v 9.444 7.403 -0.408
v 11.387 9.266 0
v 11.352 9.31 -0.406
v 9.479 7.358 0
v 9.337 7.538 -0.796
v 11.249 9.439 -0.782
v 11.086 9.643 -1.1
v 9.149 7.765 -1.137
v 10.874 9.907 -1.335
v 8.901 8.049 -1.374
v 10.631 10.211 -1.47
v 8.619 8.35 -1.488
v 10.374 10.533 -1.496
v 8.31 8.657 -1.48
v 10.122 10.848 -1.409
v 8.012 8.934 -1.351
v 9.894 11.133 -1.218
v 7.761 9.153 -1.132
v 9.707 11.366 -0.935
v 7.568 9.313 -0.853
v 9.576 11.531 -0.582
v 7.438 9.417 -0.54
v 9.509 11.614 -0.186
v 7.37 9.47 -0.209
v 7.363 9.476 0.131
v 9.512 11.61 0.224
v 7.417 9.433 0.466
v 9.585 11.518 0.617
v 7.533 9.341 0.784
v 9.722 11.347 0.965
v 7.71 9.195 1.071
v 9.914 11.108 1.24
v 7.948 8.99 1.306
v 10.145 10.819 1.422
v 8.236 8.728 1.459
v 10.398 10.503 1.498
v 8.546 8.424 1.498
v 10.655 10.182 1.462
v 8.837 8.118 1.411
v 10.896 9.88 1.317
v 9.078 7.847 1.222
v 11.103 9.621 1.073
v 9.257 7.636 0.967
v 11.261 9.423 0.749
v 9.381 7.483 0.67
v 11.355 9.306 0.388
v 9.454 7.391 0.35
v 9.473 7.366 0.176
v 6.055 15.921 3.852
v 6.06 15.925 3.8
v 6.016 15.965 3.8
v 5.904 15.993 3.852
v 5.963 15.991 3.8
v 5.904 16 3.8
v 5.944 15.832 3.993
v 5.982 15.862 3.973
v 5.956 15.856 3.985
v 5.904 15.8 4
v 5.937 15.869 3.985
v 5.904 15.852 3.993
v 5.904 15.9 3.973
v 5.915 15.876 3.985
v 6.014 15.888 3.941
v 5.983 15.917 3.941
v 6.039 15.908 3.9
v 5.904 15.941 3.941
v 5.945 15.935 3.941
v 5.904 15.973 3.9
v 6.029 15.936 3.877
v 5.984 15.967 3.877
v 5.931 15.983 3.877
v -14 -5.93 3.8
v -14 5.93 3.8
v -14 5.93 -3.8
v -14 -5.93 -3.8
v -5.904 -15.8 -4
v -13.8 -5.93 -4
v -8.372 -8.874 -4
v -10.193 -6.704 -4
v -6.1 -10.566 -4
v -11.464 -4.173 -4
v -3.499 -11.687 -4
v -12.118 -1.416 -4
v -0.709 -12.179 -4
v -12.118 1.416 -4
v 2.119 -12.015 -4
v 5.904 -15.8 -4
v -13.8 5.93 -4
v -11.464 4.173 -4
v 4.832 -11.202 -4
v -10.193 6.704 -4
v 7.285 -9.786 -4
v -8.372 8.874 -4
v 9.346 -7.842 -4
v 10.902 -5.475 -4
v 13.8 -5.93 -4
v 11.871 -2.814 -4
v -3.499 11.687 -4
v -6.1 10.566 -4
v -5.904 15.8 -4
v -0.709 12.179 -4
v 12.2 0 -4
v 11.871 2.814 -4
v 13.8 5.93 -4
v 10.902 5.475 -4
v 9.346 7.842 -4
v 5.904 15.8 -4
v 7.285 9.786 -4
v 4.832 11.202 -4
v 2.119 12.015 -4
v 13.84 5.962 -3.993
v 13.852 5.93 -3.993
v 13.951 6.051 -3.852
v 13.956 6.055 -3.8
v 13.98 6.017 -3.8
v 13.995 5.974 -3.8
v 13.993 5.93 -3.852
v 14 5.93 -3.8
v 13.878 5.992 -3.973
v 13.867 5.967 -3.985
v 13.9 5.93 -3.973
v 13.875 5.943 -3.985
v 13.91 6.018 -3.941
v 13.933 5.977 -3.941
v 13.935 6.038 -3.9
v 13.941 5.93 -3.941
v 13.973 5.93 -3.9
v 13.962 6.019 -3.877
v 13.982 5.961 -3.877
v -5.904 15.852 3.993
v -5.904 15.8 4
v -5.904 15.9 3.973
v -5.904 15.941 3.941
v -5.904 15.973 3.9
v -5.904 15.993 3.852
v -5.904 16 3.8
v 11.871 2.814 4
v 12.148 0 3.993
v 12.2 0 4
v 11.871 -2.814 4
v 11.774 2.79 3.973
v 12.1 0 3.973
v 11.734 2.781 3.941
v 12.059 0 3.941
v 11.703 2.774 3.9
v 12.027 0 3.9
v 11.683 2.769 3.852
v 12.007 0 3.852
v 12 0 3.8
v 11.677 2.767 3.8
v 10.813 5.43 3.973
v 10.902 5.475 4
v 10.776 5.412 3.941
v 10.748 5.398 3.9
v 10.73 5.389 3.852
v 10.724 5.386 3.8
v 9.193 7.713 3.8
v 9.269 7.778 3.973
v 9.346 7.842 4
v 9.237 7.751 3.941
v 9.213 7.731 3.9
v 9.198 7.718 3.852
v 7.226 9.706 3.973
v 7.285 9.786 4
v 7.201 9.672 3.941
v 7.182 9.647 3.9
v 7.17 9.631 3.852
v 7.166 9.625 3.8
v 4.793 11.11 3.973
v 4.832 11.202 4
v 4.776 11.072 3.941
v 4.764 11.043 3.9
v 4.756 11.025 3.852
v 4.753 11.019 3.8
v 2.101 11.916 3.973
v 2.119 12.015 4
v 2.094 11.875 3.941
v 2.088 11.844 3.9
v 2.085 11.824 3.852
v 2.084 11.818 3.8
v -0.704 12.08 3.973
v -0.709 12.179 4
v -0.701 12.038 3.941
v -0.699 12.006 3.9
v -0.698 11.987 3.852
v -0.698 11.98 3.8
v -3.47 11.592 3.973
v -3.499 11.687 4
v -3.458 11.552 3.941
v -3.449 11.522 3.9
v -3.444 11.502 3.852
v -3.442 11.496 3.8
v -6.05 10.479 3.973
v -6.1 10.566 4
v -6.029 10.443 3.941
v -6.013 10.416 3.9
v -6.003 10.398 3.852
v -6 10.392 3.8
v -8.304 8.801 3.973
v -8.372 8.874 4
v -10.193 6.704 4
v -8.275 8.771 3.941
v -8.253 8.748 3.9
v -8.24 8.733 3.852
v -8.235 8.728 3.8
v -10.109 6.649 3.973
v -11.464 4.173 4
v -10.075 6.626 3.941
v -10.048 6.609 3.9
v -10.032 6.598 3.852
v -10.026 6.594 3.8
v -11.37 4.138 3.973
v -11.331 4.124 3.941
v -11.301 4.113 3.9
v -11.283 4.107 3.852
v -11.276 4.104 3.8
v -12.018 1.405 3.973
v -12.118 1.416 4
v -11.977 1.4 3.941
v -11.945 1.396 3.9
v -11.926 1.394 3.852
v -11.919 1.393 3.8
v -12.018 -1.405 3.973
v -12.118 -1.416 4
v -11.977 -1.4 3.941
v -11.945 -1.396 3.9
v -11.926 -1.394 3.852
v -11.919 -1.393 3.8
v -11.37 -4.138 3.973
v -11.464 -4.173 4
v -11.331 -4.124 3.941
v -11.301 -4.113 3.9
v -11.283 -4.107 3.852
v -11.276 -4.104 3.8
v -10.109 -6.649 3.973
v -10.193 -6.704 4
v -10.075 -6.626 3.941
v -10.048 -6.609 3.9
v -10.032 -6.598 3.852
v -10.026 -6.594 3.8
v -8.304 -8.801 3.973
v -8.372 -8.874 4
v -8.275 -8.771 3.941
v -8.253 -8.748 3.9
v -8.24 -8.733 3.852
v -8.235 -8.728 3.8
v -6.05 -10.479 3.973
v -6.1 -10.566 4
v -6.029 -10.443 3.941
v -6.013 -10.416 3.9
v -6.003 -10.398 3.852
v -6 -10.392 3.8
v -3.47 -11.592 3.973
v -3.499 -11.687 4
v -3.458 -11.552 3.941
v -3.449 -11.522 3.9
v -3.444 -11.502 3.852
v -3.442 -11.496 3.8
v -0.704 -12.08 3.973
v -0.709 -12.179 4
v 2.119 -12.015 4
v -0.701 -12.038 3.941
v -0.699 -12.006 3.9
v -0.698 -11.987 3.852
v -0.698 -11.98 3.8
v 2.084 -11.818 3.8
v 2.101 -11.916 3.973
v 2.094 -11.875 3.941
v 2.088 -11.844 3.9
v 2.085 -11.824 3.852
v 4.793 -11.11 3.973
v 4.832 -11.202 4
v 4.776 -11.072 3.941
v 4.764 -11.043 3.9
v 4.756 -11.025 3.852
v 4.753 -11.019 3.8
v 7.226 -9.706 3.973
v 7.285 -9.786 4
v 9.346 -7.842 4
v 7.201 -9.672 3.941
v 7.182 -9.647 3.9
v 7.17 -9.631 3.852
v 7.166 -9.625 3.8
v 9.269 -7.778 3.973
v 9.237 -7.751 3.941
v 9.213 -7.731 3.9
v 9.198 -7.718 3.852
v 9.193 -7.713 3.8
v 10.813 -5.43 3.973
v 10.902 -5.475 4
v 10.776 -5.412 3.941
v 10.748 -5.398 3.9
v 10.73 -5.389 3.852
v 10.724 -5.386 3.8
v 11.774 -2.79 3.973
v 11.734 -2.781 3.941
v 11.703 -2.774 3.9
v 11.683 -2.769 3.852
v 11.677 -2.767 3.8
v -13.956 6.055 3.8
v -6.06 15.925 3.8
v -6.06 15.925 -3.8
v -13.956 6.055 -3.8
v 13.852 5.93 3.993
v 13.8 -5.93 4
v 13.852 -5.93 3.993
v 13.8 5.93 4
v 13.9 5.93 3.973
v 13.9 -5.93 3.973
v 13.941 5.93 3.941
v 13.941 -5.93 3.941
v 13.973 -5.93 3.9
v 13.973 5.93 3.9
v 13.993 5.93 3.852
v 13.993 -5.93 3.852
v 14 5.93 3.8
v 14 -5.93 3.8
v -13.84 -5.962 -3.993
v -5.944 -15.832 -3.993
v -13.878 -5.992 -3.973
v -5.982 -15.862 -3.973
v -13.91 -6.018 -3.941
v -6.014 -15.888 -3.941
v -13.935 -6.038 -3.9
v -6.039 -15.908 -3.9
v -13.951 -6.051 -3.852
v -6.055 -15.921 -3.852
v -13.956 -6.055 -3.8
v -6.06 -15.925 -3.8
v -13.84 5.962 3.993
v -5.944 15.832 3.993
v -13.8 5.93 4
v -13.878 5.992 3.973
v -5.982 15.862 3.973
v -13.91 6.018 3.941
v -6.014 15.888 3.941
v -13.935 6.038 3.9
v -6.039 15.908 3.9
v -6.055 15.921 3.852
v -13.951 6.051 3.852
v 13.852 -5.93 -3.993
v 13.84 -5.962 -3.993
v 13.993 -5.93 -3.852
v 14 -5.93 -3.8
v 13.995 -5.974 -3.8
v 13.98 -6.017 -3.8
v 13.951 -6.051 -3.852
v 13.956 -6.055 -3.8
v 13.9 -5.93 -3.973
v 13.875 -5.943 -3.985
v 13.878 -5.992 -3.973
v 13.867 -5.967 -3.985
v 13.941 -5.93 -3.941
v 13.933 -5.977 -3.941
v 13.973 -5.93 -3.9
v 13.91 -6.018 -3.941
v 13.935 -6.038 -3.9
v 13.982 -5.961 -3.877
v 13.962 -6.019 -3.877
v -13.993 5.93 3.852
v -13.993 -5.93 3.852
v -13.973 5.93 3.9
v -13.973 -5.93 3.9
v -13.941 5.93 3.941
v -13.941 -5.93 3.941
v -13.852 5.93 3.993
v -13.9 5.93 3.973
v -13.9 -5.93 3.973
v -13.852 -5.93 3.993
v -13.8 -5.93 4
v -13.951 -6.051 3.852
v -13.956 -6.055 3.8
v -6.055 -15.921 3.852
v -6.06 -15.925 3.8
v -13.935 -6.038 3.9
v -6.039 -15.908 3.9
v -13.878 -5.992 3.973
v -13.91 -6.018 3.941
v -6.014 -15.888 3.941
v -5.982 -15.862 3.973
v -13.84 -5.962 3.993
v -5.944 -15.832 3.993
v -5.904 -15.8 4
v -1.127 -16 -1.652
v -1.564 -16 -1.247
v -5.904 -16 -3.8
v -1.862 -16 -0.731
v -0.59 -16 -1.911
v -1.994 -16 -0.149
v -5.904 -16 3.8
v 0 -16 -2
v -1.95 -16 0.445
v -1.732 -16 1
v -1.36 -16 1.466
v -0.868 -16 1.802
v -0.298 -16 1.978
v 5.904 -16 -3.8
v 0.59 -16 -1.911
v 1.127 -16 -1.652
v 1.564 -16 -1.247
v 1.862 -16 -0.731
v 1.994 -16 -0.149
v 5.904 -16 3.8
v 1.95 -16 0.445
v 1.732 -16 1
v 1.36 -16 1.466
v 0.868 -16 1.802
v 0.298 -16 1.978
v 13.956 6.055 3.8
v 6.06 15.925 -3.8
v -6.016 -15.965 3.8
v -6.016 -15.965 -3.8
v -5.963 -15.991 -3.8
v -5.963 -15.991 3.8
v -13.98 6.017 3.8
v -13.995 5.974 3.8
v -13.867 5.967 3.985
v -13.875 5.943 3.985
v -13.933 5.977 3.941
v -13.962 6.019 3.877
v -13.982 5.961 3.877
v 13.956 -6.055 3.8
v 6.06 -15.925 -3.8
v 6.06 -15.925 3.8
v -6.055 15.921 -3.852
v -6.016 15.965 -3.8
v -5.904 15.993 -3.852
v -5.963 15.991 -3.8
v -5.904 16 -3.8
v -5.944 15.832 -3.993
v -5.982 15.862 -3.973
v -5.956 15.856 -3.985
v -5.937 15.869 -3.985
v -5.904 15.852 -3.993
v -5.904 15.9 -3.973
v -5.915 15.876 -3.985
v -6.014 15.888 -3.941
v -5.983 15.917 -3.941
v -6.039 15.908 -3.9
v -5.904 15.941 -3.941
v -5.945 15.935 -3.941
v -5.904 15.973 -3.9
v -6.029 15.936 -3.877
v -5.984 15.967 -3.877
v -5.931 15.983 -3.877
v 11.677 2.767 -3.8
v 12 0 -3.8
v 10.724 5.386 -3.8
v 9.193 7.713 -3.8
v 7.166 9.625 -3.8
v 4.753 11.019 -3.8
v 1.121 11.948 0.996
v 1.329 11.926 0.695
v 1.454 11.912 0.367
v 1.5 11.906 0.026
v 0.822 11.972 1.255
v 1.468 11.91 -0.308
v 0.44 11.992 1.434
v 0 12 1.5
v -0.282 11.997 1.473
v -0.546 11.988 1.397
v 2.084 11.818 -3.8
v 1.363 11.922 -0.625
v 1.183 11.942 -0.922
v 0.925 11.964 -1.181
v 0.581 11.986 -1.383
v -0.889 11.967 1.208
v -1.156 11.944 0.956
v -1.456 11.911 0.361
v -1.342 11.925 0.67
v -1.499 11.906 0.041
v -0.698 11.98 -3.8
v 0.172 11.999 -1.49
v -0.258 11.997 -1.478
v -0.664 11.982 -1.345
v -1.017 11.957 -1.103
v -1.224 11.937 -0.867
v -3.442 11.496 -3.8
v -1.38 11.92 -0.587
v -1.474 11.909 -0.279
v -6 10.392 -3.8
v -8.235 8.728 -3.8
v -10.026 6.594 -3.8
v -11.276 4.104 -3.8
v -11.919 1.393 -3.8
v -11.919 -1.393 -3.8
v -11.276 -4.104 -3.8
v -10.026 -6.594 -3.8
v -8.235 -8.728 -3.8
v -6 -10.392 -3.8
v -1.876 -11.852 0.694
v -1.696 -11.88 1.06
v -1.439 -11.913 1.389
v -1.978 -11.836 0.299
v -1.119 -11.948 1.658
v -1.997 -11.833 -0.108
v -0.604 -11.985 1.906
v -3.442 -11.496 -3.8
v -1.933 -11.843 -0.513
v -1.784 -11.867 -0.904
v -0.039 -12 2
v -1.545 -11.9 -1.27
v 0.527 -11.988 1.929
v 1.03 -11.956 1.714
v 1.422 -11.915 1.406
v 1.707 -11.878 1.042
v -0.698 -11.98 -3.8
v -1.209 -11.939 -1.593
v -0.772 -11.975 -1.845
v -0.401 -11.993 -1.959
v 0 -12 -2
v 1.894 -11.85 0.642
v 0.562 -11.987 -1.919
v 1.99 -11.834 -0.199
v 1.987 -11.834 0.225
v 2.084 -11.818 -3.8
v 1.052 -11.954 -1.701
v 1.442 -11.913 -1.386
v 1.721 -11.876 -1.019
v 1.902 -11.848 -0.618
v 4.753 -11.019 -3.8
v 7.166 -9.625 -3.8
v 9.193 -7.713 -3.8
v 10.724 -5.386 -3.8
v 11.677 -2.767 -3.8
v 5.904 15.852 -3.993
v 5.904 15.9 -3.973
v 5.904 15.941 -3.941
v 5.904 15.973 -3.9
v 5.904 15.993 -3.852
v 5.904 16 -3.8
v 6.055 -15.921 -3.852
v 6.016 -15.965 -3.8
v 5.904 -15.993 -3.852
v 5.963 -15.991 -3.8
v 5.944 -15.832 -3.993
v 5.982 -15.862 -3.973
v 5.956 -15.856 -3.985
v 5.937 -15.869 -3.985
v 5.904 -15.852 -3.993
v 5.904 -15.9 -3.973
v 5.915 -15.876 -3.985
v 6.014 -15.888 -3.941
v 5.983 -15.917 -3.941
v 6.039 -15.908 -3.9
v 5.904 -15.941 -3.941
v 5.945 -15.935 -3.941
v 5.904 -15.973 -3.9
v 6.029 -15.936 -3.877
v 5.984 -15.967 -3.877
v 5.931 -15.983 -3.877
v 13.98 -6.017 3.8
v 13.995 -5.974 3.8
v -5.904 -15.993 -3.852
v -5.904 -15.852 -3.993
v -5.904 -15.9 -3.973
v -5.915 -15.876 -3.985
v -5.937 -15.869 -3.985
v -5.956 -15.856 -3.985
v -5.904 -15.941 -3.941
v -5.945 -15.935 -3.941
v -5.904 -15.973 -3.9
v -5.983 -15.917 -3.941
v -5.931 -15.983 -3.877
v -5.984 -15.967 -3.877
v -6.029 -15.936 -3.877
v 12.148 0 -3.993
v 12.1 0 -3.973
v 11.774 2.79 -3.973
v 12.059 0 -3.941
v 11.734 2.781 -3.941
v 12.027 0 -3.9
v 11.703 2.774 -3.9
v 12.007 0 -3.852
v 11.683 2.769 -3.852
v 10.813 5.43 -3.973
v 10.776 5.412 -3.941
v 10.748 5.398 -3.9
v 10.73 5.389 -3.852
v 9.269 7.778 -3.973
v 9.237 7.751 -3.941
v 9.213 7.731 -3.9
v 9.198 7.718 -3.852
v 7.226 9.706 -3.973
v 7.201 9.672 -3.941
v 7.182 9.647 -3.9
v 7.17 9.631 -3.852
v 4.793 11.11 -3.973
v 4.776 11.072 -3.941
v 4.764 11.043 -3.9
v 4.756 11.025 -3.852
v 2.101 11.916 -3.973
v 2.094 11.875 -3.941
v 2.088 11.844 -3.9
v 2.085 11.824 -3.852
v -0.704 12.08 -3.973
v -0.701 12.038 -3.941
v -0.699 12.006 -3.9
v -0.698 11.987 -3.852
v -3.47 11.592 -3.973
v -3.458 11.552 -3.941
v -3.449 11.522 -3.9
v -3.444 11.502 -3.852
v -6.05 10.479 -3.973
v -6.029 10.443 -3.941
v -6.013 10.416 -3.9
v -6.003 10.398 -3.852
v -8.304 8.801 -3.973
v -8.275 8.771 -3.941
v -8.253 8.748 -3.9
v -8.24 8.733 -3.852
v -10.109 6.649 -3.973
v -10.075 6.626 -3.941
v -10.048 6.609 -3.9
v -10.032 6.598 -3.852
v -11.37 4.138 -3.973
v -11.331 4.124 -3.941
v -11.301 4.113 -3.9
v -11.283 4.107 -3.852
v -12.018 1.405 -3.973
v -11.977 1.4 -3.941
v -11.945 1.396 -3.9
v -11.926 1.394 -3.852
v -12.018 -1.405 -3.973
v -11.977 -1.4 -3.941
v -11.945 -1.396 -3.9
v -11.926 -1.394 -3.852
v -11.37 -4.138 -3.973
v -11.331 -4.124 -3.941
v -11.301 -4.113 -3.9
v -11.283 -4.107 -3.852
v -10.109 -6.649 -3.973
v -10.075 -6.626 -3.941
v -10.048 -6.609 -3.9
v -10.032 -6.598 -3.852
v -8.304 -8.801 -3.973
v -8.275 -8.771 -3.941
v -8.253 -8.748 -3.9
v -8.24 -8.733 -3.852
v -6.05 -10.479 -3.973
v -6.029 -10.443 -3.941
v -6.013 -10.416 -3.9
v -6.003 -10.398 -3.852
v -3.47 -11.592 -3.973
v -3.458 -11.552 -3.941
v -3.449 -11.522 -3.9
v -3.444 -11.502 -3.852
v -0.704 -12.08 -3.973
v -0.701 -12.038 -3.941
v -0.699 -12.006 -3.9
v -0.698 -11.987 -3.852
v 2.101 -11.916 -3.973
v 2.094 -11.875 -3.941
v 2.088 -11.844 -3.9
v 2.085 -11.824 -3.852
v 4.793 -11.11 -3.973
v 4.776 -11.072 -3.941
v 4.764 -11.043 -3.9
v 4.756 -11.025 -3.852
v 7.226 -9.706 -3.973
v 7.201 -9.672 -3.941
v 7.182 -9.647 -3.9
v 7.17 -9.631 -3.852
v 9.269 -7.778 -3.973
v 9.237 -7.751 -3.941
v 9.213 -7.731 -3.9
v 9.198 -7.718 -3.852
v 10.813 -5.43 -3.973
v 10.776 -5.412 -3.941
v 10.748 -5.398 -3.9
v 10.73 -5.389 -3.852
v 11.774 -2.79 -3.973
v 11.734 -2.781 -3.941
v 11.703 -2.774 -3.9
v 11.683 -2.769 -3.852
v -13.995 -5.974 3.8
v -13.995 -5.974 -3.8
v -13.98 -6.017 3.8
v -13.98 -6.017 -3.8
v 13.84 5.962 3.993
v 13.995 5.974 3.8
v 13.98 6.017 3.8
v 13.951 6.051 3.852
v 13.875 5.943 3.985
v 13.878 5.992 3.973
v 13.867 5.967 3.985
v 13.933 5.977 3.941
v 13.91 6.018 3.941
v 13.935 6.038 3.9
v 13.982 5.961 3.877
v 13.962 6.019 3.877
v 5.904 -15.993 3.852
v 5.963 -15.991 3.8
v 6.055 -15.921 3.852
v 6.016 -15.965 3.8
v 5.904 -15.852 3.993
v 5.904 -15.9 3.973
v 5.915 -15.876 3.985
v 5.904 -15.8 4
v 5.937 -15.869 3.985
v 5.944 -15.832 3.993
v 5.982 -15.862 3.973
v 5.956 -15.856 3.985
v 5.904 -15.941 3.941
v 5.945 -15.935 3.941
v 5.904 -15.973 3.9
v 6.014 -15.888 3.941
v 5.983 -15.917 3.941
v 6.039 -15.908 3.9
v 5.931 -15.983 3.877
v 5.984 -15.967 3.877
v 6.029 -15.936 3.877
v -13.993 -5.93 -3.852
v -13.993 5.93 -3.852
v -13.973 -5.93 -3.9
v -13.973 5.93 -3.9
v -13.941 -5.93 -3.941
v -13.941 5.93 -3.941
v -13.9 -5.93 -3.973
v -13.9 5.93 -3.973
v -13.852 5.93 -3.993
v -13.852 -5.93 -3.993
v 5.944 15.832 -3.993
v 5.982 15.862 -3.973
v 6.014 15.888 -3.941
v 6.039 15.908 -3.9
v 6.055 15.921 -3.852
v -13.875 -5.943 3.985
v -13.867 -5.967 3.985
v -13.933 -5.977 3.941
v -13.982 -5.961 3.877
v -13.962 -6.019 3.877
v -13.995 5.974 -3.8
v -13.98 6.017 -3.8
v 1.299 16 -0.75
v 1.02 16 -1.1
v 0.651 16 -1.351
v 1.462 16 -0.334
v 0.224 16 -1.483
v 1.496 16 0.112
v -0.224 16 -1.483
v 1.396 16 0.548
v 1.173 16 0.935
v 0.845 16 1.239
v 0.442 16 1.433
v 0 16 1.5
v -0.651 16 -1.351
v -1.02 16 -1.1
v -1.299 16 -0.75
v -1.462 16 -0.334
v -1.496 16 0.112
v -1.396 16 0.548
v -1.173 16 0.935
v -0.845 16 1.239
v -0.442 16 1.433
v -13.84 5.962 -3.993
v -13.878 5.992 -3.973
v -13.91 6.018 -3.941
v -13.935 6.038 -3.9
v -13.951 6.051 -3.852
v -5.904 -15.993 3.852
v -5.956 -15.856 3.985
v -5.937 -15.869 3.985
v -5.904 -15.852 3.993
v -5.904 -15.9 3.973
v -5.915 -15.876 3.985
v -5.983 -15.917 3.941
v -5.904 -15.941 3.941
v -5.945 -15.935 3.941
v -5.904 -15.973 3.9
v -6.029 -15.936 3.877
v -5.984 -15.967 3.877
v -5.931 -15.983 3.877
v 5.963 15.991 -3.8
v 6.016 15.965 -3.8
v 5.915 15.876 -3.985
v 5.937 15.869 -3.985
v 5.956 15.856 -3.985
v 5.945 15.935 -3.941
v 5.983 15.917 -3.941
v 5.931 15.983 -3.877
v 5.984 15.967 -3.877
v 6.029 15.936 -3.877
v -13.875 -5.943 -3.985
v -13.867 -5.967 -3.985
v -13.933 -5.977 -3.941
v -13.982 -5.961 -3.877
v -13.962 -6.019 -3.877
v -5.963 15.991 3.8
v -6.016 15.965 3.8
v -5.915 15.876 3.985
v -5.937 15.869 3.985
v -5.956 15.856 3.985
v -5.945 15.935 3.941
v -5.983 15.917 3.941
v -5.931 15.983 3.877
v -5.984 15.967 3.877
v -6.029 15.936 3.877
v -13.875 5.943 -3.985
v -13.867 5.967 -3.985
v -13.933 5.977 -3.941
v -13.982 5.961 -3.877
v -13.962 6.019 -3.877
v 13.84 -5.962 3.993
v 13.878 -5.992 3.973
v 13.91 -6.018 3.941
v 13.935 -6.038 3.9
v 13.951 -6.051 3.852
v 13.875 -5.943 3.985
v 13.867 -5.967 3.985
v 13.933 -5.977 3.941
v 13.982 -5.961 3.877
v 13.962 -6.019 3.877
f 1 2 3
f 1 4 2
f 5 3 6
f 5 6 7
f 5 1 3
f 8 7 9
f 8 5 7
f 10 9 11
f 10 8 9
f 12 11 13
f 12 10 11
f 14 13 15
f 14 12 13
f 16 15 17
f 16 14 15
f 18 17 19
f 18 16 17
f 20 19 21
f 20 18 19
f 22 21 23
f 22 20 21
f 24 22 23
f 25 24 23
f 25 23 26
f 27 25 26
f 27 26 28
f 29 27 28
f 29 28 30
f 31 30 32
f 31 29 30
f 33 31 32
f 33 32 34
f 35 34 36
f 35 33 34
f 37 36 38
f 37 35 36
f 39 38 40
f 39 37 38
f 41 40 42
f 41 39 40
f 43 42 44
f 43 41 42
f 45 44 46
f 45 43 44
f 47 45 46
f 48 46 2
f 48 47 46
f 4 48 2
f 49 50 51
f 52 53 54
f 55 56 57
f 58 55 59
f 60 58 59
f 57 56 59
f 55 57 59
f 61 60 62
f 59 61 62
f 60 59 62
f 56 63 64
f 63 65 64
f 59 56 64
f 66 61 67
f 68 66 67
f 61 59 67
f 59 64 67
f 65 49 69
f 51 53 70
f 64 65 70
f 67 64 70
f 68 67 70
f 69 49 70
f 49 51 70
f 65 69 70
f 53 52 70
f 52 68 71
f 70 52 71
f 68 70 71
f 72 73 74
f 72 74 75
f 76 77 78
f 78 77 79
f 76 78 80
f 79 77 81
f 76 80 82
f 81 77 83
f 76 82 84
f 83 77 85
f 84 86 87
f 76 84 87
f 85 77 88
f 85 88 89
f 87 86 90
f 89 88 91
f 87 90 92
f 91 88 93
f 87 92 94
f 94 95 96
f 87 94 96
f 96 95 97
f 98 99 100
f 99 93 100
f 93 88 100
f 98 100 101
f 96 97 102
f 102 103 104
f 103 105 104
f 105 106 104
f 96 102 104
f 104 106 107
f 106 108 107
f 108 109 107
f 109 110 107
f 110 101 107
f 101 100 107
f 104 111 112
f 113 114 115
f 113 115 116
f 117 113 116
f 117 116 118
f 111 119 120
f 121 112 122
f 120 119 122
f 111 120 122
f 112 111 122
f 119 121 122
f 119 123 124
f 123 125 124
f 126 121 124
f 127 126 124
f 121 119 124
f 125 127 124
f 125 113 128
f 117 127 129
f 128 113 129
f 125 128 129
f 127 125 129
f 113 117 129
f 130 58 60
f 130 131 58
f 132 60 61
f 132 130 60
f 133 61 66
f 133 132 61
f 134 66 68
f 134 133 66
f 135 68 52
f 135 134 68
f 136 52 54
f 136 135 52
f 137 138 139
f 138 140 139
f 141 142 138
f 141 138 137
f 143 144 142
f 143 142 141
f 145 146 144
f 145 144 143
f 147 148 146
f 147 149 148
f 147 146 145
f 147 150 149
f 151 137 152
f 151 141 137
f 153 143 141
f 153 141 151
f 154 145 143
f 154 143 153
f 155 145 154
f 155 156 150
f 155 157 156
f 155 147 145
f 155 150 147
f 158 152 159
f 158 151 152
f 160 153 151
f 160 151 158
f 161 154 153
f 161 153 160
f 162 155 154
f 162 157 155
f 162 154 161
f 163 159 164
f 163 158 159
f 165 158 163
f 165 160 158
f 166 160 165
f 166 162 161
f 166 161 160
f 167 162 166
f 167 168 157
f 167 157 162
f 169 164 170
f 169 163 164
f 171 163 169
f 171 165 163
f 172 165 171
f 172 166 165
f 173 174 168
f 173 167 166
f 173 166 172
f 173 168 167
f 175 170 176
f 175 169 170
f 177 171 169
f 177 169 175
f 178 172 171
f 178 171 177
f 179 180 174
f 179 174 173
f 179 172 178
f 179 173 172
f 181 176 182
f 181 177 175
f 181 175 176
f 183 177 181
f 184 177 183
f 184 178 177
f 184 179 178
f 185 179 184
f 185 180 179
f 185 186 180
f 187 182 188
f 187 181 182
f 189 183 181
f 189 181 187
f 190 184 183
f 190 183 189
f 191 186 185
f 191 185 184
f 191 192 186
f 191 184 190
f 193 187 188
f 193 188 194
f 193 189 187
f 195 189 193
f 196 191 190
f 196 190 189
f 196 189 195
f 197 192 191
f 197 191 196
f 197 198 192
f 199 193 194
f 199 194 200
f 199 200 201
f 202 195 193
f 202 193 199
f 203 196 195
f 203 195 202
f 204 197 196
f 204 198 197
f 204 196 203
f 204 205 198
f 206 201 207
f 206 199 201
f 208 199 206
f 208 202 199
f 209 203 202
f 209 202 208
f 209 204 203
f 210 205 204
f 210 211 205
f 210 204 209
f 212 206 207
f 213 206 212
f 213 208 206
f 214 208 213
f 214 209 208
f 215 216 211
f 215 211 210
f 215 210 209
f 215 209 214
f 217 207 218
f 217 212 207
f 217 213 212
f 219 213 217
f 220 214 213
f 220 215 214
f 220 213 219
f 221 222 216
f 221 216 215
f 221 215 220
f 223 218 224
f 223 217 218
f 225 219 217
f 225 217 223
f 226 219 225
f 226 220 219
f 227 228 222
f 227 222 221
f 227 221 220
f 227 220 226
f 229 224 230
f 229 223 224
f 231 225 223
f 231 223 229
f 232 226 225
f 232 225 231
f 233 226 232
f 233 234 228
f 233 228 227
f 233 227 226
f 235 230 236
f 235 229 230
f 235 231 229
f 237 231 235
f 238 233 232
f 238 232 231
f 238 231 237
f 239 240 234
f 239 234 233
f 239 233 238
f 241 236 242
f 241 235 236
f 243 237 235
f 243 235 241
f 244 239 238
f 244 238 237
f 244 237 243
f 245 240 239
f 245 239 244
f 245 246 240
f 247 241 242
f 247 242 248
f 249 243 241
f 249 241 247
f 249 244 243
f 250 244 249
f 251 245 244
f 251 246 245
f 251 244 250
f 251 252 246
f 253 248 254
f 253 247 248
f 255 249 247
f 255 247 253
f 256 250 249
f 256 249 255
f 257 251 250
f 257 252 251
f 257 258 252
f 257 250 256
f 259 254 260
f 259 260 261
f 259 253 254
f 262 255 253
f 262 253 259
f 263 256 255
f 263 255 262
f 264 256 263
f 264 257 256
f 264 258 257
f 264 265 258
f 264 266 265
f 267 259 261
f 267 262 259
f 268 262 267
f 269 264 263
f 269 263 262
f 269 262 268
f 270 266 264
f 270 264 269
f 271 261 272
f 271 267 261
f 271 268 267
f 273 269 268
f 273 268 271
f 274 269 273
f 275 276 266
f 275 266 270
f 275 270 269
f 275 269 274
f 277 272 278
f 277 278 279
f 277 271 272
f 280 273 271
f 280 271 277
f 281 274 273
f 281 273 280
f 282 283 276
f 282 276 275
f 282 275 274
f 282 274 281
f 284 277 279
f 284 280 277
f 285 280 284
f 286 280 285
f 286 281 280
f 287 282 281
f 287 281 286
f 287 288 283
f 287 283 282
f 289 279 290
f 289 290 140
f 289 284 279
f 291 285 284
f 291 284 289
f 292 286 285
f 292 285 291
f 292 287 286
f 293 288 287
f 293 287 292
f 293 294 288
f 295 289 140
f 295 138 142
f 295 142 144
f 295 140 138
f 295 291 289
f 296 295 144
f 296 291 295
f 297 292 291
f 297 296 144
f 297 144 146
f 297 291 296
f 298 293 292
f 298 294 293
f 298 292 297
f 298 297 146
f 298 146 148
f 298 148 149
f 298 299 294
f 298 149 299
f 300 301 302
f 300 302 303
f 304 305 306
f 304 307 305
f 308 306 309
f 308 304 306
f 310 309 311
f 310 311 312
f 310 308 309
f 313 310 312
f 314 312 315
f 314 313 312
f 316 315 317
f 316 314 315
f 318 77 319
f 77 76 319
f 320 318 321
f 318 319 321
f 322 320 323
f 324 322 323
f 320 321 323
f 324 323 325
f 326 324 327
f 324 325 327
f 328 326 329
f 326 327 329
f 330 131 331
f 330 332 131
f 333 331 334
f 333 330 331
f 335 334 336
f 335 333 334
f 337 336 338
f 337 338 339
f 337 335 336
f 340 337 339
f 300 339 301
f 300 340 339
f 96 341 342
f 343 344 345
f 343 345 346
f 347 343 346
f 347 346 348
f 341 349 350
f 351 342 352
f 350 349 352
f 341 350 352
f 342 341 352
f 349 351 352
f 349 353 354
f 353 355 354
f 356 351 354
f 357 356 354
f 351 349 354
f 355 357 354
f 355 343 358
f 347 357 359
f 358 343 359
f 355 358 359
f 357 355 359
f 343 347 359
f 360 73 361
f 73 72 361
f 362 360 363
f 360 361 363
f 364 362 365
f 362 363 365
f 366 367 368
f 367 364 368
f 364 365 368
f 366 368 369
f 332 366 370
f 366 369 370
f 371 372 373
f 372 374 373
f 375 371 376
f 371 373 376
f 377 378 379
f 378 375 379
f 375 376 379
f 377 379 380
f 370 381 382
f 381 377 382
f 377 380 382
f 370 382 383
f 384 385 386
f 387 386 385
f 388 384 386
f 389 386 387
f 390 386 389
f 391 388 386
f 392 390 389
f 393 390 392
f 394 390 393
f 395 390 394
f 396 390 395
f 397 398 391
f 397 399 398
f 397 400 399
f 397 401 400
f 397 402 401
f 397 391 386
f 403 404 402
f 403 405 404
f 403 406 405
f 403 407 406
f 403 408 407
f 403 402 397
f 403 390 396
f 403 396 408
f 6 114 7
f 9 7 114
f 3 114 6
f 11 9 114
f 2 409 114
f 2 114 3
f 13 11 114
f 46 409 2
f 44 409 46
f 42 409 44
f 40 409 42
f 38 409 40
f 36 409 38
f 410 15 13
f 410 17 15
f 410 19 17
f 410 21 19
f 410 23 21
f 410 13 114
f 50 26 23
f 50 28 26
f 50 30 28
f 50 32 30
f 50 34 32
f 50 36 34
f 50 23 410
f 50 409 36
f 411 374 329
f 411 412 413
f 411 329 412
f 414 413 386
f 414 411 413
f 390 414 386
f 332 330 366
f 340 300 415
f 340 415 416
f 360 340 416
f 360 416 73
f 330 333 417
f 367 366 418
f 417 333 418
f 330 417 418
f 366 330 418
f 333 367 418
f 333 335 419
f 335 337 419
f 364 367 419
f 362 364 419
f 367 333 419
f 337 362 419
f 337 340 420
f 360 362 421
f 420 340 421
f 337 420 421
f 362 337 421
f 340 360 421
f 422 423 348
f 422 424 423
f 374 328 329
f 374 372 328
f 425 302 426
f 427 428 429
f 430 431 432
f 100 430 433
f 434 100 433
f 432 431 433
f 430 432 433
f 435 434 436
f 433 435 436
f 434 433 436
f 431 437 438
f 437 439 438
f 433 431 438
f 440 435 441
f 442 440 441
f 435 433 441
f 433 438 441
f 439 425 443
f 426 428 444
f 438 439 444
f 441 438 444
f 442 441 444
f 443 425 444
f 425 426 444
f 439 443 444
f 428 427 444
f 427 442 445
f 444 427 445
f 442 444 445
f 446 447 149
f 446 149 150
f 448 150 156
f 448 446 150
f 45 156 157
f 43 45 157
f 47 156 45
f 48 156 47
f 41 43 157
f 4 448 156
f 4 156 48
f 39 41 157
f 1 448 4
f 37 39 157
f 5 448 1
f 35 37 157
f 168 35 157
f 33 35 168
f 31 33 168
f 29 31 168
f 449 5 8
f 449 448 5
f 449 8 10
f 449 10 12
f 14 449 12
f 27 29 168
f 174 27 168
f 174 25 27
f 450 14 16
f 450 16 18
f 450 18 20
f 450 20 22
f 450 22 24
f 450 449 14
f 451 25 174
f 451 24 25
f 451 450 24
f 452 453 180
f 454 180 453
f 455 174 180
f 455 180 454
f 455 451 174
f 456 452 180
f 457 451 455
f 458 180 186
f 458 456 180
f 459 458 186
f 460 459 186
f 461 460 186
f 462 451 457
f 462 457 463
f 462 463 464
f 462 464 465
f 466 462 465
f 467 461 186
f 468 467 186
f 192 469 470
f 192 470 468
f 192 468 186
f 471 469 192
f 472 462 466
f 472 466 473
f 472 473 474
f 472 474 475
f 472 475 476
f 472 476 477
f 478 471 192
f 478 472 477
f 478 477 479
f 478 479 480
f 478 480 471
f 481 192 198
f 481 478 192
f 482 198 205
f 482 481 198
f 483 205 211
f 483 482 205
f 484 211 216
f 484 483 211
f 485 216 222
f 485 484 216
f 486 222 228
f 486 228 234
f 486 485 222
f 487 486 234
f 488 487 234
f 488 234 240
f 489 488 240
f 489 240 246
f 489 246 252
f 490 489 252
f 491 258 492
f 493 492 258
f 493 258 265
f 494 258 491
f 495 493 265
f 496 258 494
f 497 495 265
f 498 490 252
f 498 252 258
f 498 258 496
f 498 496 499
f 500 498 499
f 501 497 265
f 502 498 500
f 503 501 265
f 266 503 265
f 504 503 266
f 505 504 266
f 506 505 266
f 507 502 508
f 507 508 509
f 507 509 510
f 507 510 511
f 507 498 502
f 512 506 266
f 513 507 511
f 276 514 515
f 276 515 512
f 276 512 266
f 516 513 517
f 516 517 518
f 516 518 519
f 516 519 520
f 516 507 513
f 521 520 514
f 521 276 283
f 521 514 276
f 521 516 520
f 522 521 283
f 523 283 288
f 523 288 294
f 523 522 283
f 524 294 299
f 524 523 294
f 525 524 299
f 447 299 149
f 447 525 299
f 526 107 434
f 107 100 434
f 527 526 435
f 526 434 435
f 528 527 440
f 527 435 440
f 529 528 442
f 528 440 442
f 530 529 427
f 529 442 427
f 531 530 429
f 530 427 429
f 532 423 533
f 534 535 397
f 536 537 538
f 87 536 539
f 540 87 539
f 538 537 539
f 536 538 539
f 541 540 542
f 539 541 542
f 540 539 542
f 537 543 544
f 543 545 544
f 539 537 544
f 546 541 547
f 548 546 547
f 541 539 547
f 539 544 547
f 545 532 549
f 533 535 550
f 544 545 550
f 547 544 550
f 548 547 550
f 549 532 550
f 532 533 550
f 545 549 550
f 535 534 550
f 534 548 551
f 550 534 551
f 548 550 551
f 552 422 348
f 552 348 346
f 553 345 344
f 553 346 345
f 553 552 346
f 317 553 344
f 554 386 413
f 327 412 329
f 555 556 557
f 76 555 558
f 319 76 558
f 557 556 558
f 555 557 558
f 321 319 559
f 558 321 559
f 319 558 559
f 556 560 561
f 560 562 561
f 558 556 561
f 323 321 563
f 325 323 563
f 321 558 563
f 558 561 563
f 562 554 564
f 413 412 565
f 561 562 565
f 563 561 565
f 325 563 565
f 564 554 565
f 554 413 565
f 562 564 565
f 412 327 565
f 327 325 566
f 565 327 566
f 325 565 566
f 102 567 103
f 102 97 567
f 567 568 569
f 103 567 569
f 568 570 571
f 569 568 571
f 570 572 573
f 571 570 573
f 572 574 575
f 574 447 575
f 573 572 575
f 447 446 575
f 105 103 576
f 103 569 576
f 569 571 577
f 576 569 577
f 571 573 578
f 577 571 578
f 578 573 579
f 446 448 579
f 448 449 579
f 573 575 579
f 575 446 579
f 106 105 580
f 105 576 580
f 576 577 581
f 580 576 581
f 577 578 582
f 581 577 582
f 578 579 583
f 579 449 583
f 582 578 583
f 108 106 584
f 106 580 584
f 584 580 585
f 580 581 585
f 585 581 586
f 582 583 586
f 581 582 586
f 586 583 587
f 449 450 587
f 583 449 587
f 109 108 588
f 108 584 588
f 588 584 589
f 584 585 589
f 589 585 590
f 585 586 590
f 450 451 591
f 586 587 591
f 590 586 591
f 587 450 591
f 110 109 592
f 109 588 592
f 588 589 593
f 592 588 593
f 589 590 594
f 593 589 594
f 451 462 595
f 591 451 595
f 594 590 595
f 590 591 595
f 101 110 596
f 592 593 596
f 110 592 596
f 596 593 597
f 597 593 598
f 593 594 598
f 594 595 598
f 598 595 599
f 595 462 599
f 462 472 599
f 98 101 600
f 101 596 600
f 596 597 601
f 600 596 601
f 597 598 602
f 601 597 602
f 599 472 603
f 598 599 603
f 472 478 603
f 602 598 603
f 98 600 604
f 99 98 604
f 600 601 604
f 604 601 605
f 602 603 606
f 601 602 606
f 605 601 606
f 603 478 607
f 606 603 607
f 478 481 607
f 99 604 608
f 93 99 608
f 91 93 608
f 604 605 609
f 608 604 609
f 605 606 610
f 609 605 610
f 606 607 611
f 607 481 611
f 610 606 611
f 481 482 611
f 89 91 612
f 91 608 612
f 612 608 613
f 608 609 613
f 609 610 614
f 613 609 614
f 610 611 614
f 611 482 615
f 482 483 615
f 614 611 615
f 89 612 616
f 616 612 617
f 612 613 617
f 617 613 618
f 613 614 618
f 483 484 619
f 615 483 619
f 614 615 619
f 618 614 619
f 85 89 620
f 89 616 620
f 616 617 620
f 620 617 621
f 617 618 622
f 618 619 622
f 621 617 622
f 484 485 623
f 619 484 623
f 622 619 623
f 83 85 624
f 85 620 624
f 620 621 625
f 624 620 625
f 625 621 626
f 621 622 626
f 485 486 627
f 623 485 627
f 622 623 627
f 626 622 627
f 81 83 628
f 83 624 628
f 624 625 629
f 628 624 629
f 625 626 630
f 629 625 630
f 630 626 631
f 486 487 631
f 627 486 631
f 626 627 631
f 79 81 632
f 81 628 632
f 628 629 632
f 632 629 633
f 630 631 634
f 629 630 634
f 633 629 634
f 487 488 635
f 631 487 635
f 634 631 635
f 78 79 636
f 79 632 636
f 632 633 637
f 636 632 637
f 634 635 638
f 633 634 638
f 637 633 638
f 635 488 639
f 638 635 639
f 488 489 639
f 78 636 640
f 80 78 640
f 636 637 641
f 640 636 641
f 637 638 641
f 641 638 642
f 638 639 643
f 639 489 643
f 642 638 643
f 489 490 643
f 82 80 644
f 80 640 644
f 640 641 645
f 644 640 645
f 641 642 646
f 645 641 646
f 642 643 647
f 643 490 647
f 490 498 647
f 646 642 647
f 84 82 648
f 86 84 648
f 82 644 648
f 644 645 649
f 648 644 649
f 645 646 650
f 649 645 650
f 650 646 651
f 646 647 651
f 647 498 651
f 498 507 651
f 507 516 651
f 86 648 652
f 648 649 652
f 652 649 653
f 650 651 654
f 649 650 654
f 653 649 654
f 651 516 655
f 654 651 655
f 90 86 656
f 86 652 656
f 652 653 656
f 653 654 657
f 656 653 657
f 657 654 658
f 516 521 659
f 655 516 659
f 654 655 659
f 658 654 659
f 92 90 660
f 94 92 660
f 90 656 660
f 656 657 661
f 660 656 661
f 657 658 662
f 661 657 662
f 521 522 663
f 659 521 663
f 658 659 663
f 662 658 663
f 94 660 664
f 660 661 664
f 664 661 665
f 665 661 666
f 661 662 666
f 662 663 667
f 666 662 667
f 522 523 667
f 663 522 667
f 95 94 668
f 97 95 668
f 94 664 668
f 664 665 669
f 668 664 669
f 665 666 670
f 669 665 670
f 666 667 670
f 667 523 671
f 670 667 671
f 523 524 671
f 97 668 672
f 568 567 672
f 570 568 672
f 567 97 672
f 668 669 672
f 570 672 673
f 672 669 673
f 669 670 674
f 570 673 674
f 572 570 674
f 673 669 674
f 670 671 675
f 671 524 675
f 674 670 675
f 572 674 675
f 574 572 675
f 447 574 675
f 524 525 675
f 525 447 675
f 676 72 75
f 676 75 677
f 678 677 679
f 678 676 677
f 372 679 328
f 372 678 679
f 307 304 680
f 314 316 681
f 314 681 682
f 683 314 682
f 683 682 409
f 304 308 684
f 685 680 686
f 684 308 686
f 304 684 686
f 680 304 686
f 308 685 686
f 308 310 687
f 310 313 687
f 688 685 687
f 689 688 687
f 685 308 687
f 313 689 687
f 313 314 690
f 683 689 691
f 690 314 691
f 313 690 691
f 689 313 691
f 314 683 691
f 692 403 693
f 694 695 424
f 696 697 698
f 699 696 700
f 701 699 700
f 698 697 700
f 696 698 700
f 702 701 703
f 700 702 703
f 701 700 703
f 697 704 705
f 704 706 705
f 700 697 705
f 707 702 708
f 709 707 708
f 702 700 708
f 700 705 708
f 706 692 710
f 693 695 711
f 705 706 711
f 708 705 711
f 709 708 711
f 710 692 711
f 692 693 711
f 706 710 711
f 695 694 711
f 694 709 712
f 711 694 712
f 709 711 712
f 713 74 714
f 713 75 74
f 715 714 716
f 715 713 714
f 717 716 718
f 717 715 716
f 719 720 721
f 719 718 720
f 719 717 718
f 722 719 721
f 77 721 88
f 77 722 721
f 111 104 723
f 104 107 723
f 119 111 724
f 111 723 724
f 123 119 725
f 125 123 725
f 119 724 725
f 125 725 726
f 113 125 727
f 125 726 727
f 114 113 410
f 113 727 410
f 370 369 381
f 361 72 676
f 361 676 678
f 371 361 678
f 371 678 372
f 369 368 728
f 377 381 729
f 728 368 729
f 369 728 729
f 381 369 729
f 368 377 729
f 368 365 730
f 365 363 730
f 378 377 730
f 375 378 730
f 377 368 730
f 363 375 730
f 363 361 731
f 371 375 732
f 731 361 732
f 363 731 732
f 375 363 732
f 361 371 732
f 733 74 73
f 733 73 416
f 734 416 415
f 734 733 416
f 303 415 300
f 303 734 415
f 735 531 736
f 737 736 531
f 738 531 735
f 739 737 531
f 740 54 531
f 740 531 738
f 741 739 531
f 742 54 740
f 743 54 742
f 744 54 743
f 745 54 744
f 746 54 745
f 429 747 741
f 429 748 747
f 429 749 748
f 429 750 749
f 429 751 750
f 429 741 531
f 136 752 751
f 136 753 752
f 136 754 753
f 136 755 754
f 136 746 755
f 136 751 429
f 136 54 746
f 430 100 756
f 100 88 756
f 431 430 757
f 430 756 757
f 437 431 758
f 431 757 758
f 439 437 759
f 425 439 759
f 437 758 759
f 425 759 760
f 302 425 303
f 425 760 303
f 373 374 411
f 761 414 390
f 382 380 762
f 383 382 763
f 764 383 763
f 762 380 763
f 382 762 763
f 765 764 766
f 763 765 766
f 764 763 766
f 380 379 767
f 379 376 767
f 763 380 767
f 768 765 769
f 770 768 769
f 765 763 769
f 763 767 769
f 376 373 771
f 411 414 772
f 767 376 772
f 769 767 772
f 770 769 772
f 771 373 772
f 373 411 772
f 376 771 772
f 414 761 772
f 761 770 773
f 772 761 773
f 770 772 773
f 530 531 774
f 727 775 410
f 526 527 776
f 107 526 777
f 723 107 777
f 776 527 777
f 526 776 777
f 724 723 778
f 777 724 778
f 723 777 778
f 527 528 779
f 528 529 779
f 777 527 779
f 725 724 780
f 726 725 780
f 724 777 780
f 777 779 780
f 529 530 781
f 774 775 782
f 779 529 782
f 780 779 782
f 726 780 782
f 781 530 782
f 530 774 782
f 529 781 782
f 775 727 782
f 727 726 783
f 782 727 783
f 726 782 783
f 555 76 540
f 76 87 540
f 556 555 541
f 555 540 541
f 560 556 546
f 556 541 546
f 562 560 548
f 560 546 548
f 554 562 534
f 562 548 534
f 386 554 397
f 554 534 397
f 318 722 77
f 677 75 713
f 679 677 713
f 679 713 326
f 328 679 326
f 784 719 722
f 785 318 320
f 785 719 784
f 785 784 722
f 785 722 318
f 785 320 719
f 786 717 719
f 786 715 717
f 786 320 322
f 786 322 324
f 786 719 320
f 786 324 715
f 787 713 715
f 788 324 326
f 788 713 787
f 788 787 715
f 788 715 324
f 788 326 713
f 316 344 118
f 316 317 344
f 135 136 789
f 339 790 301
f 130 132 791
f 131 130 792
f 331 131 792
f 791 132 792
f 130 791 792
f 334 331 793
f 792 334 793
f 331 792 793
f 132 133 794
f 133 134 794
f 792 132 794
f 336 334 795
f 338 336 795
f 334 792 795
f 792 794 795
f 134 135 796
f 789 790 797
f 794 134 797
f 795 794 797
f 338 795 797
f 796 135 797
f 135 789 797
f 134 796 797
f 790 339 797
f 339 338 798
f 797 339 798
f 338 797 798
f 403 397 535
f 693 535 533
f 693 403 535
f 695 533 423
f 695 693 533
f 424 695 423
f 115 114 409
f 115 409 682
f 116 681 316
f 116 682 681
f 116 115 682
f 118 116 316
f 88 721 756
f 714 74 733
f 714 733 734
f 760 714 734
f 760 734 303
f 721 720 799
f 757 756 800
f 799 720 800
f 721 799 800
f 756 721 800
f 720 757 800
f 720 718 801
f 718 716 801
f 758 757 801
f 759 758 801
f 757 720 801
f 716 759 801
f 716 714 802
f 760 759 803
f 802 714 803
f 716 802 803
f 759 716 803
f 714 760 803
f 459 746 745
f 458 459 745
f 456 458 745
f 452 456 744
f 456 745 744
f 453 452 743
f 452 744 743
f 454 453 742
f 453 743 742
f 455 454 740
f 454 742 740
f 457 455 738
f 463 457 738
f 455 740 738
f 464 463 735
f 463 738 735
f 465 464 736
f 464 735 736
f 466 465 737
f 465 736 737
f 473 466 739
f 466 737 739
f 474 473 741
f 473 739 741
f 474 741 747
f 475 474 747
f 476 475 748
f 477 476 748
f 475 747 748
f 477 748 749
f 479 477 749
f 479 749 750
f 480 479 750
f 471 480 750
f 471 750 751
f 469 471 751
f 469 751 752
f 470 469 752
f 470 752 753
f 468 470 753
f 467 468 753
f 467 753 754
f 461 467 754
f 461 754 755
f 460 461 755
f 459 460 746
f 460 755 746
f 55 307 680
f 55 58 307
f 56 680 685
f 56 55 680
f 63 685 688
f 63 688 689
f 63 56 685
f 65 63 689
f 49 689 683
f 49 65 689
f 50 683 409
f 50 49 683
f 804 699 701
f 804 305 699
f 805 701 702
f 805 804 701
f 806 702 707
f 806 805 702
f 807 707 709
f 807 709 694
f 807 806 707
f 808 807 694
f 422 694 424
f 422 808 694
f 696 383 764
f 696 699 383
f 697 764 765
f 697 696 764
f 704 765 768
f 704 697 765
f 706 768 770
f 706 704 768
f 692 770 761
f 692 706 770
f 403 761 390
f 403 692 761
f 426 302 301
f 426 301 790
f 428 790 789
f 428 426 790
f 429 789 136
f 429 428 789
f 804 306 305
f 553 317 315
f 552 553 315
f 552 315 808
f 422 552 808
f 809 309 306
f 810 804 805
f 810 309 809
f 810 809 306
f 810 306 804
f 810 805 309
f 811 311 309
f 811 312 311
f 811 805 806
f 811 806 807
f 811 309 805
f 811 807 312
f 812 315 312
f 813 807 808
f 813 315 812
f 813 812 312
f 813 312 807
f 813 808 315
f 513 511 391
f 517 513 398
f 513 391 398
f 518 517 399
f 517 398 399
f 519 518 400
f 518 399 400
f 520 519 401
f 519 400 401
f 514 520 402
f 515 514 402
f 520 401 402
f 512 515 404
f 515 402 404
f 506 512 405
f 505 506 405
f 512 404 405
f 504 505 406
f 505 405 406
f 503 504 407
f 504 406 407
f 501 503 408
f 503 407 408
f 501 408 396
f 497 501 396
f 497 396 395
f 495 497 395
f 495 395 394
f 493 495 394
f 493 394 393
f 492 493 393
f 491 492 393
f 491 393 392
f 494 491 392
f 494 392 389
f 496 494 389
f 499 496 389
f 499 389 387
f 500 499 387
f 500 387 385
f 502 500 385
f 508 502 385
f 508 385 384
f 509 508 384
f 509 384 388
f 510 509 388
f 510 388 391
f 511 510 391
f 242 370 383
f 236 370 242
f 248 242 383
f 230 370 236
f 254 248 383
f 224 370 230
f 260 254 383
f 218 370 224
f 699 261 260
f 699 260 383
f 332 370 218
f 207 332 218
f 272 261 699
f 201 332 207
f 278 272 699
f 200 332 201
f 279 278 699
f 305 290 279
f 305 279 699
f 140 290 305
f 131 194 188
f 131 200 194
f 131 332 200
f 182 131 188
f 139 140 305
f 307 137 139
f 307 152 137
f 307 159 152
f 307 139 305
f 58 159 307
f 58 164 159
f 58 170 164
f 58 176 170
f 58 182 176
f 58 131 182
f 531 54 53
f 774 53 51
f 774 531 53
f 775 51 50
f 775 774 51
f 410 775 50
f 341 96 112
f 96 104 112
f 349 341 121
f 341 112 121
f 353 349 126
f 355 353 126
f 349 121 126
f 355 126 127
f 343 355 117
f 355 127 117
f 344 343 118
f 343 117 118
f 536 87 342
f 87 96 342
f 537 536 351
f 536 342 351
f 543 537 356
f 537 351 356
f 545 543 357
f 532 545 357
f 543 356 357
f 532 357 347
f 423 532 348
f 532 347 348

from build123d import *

# Parameters (mm, degrees)
SKETCH1_R           = 12
BOSS_EXTRUDE1_DEPTH = 4
SKETCH3_R           = 1.5
CUT_EXTRUDE1_DEPTH  = 8
SKETCH4_R           = 2
CUT_EXTRUDE2_DEPTH  = 8
FILLET1_R           = 0.2


with BuildPart() as part:
    # Sketch1 → Boss-Extrude1 (new, symmetric)
    with BuildSketch(Plane.XY):
        Polygon((-14, 6), (-14, -6), (-6, -16), (6, -16), (14, -6), (14, 6), (6, 16), (-6, 16), align=None)
        Circle(SKETCH1_R, mode=Mode.SUBTRACT)
    extrude(amount=BOSS_EXTRUDE1_DEPTH, both=True)

    # Sketch2 → Cut-Revolve1 (revolve, cut)
    with BuildSketch(Plane.XY, mode=Mode.PRIVATE) as cut_revolve1_sk:
        Polygon((7.590491025, 7.590491025), (12.891478597, 12.891478597), (11.830818425, 13.952138769), (6.529830853, 8.651151197), align=None)
    revolve(cut_revolve1_sk.sketch.rotate(Axis((7.590491025, 7.590491025, 0), (0.7071067811865511, 0.707106781186544, 0)), 180), axis=Axis((7.590491025, 7.590491025, 0), (0.7071067811865511, 0.707106781186544, 0)), mode=Mode.SUBTRACT)

    # Sketch3 → Cut-Extrude1 (cut)
    with BuildSketch(Plane(origin=(0, 16, 0), x_dir=(1, 0, 0), z_dir=(0, 1, 0))):
        with Locations(Location((0, 0, 0), (0, 0, 270))):
            Circle(SKETCH3_R)
    extrude(amount=-CUT_EXTRUDE1_DEPTH, mode=Mode.SUBTRACT)

    # Sketch4 → Cut-Extrude2 (cut)
    with BuildSketch(Plane.XZ.offset(16)):
        with Locations(Location((0, 0, 0), (0, 0, 270))):
            Circle(SKETCH4_R)
    extrude(amount=-CUT_EXTRUDE2_DEPTH, mode=Mode.SUBTRACT)

    # Fillet1
    fillet1_edges = [part.edges().sort_by_distance(p)[0] for p in [
        (14, 0, -4),
        (10, -11, -4),
        (0, -16, -4),
        (-10, -11, -4),
        (10, -11, 4),
        (-14, -6, 0),
        (-14, 6, 0),
        (-6, 16, 0),
        (6, 16, 0),
        (14, 6, 0),
        (14, -6, 0),
        (6, -16, 0),
        (-6, -16, 0),
        (14, 0, 4),
        (10, 11, 4),
        (-12, 0, -4),
        (-12, 0, 4),
        (0, 16, 4),
        (-10, 11, 4),
        (-14, 0, 4),
        (-10, -11, 4),
        (-14, 0, -4),
        (0, -16, 4),
        (-10, 11, -4),
        (0, 16, -4),
        (10, 11, -4),
    ]]
    fillet(fillet1_edges, radius=FILLET1_R)


solid = part.part
